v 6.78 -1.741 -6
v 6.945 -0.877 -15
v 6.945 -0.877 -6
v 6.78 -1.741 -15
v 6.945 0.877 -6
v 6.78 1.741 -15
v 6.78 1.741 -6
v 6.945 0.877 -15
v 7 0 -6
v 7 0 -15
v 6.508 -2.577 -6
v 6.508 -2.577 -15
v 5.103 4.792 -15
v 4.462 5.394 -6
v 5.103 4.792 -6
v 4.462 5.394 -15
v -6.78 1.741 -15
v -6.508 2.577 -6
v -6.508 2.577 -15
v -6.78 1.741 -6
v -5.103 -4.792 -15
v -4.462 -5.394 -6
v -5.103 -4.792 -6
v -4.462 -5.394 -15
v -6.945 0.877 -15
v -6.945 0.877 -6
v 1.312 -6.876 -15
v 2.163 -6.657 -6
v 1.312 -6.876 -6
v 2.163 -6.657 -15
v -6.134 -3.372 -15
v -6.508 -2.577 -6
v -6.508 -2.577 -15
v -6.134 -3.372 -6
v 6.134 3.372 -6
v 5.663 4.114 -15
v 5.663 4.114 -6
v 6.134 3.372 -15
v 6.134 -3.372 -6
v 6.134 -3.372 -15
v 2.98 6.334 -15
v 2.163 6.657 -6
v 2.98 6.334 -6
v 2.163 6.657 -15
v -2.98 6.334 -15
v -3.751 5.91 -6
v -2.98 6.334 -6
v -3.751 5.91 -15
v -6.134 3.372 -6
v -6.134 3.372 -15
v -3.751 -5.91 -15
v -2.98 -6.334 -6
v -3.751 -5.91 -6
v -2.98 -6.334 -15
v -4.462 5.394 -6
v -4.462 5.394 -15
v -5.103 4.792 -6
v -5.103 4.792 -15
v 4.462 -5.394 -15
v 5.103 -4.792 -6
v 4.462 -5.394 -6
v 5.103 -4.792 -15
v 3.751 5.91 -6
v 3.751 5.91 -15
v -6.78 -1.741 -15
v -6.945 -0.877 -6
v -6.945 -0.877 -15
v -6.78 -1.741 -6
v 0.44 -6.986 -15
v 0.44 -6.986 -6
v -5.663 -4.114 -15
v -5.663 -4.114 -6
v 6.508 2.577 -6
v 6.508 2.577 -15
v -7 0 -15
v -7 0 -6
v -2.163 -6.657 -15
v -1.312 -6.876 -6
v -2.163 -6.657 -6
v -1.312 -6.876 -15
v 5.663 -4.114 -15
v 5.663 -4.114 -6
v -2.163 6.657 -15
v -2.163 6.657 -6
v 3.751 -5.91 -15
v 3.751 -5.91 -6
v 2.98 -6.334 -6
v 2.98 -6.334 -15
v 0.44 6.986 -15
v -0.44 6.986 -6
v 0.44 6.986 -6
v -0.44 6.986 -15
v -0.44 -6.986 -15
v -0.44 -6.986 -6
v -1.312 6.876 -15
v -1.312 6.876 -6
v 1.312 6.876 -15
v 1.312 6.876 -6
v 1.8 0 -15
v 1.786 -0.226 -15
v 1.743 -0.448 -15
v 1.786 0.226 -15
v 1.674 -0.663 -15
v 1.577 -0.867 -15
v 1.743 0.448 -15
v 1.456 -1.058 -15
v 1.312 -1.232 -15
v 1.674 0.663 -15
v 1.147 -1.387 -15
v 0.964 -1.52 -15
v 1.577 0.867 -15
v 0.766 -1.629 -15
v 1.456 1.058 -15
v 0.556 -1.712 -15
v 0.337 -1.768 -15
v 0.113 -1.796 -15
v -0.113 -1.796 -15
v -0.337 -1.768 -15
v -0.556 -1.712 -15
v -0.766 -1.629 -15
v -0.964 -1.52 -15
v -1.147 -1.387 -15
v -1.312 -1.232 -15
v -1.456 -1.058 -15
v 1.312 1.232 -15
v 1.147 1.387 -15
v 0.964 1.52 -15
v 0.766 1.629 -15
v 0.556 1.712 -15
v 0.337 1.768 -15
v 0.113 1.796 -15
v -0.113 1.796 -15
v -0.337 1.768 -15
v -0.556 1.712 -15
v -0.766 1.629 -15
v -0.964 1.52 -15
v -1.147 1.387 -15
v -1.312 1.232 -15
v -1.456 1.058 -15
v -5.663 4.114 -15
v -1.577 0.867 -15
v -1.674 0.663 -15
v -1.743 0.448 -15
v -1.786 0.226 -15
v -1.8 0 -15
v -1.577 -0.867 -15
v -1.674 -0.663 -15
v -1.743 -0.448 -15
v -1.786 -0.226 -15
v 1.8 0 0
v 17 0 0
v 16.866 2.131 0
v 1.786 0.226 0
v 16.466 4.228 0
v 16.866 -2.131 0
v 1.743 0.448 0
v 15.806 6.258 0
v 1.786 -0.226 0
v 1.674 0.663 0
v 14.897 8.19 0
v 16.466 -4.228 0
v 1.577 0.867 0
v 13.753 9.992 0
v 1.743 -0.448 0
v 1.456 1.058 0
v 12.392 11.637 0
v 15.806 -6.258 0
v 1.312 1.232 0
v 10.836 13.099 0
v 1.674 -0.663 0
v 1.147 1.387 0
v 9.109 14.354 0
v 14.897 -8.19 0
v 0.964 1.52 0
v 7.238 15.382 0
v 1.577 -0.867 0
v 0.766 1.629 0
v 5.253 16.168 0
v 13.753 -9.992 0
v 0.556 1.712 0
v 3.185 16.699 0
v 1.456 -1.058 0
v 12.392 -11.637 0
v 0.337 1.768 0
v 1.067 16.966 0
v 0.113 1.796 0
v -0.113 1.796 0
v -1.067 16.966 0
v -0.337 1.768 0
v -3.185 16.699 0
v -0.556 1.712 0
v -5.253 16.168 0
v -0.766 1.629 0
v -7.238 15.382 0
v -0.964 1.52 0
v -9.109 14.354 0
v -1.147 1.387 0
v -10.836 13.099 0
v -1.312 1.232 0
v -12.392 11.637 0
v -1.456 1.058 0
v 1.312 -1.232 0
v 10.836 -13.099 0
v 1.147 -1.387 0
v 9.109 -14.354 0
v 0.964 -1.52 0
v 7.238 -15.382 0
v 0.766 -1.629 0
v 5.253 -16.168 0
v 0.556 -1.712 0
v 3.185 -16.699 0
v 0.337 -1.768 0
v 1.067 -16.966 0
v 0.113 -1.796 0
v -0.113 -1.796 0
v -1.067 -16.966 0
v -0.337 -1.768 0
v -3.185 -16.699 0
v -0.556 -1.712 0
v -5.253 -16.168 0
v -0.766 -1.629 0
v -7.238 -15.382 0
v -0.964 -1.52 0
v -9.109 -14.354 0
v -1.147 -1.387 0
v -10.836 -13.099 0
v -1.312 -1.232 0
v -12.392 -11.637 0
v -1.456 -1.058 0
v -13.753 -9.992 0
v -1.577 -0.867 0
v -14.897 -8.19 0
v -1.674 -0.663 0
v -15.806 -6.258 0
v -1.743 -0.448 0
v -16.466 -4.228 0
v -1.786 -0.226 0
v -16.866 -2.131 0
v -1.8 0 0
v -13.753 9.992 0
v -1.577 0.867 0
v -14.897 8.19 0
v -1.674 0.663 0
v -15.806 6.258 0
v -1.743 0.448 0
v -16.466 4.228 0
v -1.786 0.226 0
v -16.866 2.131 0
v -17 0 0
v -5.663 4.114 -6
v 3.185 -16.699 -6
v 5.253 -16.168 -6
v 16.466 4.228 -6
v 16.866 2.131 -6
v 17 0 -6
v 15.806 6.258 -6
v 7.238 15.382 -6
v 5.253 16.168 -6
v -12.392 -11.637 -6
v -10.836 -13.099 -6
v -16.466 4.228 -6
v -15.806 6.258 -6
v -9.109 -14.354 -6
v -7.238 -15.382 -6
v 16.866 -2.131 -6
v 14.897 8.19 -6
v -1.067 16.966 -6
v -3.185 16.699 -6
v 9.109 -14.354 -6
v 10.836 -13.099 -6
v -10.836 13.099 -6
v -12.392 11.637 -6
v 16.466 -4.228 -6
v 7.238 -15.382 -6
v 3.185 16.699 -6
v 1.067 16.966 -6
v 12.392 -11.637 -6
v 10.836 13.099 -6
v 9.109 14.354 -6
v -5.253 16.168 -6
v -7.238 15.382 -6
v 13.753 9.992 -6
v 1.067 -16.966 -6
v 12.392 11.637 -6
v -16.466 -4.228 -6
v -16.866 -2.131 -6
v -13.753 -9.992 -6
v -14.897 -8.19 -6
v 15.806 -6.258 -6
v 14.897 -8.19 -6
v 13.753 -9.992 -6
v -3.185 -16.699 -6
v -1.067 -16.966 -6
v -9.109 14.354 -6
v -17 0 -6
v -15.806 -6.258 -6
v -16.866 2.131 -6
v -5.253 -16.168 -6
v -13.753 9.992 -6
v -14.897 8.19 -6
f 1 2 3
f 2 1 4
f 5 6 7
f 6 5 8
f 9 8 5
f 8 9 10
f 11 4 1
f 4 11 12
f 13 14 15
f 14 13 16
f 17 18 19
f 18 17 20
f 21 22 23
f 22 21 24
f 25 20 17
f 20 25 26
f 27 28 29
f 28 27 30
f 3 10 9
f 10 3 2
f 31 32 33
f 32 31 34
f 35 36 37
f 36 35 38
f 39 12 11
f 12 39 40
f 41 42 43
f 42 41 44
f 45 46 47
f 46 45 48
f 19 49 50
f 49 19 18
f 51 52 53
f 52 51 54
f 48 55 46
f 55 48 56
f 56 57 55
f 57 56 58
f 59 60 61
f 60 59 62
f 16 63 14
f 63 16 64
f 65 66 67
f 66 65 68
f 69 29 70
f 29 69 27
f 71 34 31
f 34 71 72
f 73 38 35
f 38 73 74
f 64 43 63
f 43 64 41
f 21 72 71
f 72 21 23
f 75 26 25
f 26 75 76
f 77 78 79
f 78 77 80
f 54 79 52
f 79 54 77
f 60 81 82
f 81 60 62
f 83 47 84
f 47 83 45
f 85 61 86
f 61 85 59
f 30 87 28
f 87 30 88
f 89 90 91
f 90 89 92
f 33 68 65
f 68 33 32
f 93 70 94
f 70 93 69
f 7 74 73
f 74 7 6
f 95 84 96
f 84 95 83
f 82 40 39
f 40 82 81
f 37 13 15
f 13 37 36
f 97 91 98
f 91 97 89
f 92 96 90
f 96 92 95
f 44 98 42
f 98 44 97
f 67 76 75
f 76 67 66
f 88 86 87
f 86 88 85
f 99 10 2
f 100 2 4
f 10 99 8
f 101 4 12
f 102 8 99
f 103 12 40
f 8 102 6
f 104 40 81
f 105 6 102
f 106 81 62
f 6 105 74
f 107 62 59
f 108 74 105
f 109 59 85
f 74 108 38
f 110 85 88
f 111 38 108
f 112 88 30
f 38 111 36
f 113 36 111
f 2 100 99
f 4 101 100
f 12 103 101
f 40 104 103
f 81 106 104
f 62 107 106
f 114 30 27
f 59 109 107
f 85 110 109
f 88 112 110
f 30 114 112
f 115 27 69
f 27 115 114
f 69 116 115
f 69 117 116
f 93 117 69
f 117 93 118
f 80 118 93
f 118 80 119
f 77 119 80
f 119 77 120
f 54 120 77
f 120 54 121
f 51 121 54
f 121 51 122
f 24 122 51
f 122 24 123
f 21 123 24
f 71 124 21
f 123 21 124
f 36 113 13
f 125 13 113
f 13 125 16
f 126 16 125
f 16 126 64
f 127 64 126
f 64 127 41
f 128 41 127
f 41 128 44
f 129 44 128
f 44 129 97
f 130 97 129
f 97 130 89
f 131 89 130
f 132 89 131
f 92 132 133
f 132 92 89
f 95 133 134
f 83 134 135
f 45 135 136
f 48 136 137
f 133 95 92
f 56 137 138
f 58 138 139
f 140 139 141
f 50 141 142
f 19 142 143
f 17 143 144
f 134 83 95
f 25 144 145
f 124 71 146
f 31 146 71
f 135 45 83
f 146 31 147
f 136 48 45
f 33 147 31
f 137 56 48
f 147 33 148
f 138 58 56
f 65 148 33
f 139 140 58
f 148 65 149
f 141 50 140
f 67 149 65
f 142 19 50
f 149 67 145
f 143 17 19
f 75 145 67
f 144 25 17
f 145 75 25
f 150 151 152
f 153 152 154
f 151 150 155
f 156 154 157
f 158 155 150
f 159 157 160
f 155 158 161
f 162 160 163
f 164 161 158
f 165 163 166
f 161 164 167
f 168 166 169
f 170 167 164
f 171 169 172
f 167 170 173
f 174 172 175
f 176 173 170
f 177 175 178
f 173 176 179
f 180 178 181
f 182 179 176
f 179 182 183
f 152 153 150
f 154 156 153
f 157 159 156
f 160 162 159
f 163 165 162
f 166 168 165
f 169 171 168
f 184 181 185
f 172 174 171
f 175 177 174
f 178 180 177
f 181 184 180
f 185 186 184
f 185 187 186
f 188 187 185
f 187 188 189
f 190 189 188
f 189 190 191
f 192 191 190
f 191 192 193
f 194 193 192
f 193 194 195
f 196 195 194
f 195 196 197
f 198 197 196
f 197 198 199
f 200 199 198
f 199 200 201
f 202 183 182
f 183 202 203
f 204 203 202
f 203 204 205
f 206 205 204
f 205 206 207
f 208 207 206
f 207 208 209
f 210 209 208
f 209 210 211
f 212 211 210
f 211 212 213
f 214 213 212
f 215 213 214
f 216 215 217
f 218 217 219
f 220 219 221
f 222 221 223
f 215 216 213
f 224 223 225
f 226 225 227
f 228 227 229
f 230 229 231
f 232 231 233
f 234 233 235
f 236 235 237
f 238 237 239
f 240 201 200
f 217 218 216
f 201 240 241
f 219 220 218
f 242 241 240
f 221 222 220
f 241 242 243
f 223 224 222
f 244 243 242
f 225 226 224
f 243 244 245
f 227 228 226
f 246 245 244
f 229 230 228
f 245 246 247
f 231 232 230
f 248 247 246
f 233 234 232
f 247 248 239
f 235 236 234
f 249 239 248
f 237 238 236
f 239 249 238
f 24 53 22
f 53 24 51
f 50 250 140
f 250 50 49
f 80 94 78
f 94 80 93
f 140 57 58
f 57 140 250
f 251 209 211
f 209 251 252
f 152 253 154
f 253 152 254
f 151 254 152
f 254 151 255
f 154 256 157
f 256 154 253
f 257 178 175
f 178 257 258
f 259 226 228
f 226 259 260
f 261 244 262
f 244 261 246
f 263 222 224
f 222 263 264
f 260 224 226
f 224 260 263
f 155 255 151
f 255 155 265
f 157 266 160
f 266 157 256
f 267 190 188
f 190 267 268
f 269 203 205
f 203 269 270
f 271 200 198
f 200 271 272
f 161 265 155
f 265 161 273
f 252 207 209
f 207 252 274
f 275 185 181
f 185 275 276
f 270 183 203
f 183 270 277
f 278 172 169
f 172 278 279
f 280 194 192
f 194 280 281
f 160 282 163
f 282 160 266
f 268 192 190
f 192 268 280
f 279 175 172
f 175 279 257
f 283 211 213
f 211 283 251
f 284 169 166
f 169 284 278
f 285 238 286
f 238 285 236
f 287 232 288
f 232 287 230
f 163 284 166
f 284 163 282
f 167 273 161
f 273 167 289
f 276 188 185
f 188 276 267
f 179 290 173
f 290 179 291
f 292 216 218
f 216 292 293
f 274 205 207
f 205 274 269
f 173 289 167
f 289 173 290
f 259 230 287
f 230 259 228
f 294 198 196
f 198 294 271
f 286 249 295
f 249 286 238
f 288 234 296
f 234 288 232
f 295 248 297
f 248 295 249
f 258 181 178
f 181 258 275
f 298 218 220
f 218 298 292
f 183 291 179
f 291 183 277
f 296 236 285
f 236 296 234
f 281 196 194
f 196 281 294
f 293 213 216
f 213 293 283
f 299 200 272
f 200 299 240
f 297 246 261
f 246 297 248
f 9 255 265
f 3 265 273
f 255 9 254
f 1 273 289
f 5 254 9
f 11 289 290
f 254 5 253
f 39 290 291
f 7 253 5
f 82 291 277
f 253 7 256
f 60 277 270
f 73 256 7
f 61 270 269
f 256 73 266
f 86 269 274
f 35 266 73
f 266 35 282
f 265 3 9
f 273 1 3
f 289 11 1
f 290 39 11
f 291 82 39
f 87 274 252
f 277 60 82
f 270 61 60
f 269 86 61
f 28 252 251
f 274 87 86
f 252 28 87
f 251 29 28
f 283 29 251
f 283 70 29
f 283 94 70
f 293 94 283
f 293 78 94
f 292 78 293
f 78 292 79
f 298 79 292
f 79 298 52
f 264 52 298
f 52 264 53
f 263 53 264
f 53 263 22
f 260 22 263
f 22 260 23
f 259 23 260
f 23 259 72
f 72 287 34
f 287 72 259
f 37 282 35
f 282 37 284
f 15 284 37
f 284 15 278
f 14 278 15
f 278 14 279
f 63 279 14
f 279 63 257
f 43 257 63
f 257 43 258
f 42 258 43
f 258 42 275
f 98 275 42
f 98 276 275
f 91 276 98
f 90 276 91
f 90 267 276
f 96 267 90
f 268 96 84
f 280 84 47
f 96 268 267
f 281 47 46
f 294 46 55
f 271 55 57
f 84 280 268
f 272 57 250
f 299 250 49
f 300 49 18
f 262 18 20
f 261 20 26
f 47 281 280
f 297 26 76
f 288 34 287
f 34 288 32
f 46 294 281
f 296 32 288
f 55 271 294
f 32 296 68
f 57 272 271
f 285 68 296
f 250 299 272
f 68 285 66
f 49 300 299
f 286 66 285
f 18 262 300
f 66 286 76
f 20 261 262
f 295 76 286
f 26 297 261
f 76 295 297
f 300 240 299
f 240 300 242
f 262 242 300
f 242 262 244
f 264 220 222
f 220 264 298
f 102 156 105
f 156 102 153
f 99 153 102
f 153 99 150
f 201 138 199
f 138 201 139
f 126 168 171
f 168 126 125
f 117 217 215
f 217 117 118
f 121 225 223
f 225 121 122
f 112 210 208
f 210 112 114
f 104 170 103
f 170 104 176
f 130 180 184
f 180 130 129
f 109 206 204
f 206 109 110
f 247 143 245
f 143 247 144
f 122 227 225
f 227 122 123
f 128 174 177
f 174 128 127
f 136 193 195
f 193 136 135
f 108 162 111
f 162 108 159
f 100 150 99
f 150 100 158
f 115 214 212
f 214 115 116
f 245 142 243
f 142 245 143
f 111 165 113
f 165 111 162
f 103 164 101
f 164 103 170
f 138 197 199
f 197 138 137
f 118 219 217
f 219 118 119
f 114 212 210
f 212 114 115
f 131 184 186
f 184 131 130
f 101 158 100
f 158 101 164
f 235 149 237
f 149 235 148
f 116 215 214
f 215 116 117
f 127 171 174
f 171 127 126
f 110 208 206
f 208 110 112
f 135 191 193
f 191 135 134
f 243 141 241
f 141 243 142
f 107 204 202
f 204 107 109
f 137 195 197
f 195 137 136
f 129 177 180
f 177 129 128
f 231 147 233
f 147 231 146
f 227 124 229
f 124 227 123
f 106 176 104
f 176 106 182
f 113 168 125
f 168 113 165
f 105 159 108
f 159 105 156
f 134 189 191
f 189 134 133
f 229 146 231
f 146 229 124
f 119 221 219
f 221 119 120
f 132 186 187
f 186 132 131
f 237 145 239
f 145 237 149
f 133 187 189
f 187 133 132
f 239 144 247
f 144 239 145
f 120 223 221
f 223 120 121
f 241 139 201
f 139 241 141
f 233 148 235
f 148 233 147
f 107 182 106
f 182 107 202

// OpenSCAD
$fn = 50;


difference() {
	union() {
		translate(v = [0, 0, -15.0000000000]) {
			cylinder(h = 15, r = 7.0000000000);
		}
		translate(v = [0, 0, -6.0000000000]) {
			cylinder(h = 6, r = 17.0000000000);
		}
	}
	union() {
		#translate(v = [0, 0, -15]) {
			cylinder(h = 15, r = 1.8000000000);
		}
	}
}
